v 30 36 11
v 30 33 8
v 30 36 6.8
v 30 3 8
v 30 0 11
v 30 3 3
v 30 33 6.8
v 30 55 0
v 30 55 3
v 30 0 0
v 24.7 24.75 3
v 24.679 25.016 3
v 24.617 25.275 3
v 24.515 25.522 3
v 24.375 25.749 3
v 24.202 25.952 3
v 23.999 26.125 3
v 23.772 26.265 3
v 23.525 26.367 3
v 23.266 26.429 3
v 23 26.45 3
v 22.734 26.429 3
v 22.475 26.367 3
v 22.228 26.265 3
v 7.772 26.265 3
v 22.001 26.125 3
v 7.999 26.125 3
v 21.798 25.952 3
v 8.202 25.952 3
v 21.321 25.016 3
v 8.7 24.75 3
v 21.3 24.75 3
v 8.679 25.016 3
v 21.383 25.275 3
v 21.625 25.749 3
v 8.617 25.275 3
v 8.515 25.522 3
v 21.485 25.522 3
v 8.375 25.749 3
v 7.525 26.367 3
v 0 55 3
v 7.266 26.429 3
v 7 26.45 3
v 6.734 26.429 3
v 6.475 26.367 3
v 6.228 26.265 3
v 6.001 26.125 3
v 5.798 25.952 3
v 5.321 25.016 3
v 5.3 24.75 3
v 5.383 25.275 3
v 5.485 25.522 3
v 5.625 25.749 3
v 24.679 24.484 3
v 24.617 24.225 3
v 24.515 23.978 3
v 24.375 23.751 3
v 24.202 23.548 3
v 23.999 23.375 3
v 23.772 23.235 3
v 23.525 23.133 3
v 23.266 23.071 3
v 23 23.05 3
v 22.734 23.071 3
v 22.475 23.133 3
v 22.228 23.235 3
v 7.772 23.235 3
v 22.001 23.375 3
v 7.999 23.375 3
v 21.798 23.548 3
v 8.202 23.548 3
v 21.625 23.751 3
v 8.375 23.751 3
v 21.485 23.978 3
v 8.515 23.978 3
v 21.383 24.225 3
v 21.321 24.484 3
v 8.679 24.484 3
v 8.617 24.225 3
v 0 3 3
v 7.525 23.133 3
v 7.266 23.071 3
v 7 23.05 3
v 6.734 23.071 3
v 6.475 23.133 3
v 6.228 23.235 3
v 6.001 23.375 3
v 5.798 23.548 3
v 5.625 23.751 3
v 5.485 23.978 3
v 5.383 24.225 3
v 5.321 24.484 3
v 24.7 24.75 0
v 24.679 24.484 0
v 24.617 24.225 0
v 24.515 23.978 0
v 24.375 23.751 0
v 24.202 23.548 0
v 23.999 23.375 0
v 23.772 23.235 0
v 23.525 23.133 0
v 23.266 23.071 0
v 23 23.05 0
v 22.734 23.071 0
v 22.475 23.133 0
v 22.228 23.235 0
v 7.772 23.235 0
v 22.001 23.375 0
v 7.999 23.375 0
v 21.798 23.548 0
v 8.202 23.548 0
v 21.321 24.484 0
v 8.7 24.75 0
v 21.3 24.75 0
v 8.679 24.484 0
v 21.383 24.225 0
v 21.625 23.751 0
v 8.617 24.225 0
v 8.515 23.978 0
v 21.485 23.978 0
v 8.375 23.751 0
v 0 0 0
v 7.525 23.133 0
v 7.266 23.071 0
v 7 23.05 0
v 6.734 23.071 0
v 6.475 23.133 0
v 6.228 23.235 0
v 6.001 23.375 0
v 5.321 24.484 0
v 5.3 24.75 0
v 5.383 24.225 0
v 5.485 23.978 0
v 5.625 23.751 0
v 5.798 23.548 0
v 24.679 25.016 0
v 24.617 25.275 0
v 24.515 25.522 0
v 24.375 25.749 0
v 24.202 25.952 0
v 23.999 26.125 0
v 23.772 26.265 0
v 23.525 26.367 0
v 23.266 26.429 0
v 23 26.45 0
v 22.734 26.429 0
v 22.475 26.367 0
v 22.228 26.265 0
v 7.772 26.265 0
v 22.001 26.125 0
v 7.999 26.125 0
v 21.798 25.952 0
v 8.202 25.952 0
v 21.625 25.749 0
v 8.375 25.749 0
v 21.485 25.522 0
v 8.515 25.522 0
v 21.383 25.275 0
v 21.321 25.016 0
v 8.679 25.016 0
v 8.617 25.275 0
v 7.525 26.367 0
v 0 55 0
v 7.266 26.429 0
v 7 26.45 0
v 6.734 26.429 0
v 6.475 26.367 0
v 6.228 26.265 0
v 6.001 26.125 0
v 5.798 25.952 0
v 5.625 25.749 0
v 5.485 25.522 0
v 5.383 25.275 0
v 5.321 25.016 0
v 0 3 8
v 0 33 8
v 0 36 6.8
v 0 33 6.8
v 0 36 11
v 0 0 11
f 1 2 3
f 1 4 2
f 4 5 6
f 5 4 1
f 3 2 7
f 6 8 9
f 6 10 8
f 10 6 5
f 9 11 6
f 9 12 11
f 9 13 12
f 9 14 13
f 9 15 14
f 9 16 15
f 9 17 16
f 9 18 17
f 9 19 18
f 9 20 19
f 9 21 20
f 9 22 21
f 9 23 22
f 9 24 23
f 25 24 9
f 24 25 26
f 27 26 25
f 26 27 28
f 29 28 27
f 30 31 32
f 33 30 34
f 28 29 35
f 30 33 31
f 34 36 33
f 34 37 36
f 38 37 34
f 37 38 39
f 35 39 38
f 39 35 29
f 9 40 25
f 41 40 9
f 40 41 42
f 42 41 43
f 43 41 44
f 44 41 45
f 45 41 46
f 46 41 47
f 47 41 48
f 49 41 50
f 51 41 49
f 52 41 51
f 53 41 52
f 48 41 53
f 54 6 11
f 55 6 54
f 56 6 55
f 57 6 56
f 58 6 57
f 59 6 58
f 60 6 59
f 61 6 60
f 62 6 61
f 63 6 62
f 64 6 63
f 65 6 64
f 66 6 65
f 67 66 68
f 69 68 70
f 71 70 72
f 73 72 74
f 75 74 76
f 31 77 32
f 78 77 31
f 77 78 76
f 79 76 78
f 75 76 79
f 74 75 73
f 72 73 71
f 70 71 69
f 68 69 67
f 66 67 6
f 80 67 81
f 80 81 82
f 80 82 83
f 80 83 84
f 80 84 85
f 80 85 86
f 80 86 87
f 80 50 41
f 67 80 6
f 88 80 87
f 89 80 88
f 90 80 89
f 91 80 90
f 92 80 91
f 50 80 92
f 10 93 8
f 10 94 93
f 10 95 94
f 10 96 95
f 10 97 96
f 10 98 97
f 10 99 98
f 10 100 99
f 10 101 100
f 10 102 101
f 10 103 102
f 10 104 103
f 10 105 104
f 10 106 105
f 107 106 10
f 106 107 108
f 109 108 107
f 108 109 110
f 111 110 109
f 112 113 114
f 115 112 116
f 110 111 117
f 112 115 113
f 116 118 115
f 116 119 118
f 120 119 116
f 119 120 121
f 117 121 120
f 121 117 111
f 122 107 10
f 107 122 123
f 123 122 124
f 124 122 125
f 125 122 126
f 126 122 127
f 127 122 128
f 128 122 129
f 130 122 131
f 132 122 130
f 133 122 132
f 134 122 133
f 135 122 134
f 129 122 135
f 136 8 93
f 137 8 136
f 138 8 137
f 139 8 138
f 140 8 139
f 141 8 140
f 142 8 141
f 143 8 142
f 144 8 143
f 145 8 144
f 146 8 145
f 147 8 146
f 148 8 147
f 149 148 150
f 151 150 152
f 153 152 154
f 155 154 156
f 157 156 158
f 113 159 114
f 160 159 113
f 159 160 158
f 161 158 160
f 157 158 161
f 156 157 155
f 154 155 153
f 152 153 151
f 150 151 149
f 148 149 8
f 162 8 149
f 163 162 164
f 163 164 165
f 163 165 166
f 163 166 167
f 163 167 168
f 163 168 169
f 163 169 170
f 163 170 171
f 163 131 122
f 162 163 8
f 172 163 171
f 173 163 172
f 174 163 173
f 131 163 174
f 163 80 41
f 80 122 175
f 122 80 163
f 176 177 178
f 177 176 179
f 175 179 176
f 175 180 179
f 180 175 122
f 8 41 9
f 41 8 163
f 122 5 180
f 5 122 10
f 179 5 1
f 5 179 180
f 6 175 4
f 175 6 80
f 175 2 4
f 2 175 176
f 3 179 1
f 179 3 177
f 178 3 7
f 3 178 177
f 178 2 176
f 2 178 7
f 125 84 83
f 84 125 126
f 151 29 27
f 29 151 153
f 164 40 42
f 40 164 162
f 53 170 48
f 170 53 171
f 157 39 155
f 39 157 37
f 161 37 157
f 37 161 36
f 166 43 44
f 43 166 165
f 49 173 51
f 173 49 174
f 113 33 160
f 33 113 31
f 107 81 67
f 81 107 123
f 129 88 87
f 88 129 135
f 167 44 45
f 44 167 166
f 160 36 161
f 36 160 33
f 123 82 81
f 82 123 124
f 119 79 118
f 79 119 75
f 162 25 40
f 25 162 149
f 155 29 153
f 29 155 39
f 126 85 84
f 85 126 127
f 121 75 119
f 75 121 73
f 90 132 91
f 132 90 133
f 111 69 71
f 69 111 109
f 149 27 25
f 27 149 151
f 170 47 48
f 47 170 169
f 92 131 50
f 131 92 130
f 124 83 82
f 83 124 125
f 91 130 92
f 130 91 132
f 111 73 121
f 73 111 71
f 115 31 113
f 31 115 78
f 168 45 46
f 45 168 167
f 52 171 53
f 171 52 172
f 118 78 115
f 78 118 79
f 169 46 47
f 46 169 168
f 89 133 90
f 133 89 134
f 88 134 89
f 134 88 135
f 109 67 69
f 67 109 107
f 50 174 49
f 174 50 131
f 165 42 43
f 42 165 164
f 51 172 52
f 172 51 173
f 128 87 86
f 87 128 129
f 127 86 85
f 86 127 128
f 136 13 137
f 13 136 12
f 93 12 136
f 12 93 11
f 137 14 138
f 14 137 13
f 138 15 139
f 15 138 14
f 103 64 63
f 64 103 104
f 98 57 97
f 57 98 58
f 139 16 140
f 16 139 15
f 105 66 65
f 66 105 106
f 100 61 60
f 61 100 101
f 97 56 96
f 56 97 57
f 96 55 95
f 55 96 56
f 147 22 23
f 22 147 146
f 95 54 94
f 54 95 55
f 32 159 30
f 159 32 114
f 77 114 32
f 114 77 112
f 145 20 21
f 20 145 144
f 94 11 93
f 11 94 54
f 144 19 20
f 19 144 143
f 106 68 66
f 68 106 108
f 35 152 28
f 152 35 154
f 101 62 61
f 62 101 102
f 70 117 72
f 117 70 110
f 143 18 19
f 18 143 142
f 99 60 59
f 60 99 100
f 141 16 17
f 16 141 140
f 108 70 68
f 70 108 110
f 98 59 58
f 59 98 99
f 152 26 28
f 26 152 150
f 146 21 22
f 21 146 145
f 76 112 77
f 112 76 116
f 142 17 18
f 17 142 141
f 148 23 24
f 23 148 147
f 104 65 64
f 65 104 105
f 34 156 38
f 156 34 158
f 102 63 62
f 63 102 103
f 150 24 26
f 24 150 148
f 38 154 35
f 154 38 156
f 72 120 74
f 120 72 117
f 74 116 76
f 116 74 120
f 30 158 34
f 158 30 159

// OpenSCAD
// Belt clip for radios/tools, for belts up to `belt` mm wide; screw to the device with 2x M3. CC0.
belt = 45; t = 3; gap = 5; w = 30;
$fn = 40;
difference() {
  union() {
    cube([w, belt + 10, t]);
    translate([0, 0, 0]) cube([w, t, gap + 2 * t]);
    translate([0, 0, gap + t]) cube([w, belt * 0.8, t]);
    translate([0, belt * 0.8 - t, gap + t - 1.2]) cube([w, t, 1.2 + t]);  // retaining lip
  }
  for (x = [w / 2 - 8, w / 2 + 8]) translate([x, belt * 0.55, -1]) cylinder(d = 3.4, h = t + 2);
}
